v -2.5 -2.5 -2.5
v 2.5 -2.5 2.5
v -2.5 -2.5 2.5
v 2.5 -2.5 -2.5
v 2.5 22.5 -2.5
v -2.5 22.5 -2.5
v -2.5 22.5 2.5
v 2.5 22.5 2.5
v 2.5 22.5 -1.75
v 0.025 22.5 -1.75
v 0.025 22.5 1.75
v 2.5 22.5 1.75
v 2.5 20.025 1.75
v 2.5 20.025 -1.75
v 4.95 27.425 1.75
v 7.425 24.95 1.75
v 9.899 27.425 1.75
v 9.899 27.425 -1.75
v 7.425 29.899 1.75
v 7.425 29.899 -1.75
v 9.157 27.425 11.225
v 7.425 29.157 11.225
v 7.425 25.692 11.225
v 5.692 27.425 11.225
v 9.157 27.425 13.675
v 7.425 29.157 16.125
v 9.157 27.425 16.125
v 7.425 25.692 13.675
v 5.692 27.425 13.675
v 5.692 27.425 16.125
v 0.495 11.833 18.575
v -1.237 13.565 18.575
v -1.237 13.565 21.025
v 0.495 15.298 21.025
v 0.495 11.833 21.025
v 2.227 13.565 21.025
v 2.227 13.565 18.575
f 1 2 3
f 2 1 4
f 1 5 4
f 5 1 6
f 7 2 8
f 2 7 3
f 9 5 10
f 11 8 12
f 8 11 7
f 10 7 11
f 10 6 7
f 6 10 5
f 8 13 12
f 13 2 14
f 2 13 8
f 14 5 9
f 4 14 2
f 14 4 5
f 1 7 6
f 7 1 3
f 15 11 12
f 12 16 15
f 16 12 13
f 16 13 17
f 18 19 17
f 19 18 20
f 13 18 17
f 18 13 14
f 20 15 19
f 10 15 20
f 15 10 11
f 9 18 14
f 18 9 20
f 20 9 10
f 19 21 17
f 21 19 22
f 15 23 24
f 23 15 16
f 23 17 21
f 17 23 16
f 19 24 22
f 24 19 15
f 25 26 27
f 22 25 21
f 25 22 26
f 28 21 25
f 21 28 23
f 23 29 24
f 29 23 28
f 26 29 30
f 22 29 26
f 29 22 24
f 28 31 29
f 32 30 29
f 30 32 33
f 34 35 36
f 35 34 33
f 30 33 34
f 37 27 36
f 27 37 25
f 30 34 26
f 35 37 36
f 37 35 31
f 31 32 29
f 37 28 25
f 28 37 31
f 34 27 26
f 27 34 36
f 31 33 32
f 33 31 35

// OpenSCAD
// file: turtle.scad
use <affine.scad>

ident = a_S();
function mreduce(x) = let(lx=len(x))

    (lx>1 ? a_Xa(x[0], mreduce([for(i=[1:lx-1]) x[i]])  )
         : x[0]
    );
    
function mcume(in,out=[],next=ident) = let(li=len(in),lo=len(out))
    li == 0 ? out 
            :          
               mcume( 
                     li-1>0 ? [for(i=[1:li-1]) in[i]] : [],
                     lo>0 ? concat(out,[a_Xa(out[lo-1],next)]) : [in[0]],
                     in[1] 
                   );

function setPath(spec) =
   mcume([for(i=spec) mreduce(i)]);
        
module turtlePath(path,mod=[1,1],cycle=false,rawpath=[])
{  
  usePath = rawpath ? rawpath : setPath(path); 
  if(mod)
  {
    for(i=[0:len(usePath)-1])
    {
      if(i%mod[0]==0)
      { hull()
        {
          apply(usePath[i]){children();}
          if(len(mod)>1)
          {
            for(j=[1:len(mod)-1])
            {
              if(i+mod[j]<len(usePath))
              {
                apply(usePath[i+mod[j]]){children();} 
              }
              else
              { 
                if(cycle)
                {        
                 apply(usePath[(i+mod[j])%len(usePath)]){children();}
                }   
  } } } } } } }
  else
  {
    for(i=usePath) apply(i){children();}   
  }    
}  


///Generate affine turtle moves
///These should have more intuitive names

function turnRight(deg) = a_Rv(deg,[0,0,1]);
function turnLeft(deg) = a_Rv(deg,[0,0,-1]);
function turnUp(deg) = a_Rv(deg,[-1,0,0]);
function turnDown(deg) = a_Rv(deg,[1,0,0]);                     
function go(distance) = a_S(off=[0,distance,0]);
function goTo(vec) = a_S(off=vec);
function rollRight(deg) = a_Rv(deg,[0,-1,0]); 
function rollLeft(deg) = a_Rv(deg,[0,1,0]);
function reSize(vecA) = a_S(vec =(vecA[0]==undef ? [vecA,vecA,vecA] : vecA));  
function lookAt(vec) = a_Xa(
                             turnRight(atan(vec[0]/vec[1])),
                             ((len(vec)==3) ? 
                             turnUp(90-atan(norm([vec[0],vec[1]])/vec[2])) 
                             : ident
                             )
                           );                          
function lookGo(vec) = a_Xa(lookAt(vec),go(norm(vec)));



   
                     
         
// main file
use <turtle.scad>
path = [
                [go(0)],
                [go(20)],
                [reSize(.7),turnRight(45)],
                [go(15)],
                [turnUp(90),reSize(.7),go(10/(.7*.7))],
                [go(10)],
                [goTo([10,10,30])]
        ];
turtlePath(path){cube(5,center=true);}
